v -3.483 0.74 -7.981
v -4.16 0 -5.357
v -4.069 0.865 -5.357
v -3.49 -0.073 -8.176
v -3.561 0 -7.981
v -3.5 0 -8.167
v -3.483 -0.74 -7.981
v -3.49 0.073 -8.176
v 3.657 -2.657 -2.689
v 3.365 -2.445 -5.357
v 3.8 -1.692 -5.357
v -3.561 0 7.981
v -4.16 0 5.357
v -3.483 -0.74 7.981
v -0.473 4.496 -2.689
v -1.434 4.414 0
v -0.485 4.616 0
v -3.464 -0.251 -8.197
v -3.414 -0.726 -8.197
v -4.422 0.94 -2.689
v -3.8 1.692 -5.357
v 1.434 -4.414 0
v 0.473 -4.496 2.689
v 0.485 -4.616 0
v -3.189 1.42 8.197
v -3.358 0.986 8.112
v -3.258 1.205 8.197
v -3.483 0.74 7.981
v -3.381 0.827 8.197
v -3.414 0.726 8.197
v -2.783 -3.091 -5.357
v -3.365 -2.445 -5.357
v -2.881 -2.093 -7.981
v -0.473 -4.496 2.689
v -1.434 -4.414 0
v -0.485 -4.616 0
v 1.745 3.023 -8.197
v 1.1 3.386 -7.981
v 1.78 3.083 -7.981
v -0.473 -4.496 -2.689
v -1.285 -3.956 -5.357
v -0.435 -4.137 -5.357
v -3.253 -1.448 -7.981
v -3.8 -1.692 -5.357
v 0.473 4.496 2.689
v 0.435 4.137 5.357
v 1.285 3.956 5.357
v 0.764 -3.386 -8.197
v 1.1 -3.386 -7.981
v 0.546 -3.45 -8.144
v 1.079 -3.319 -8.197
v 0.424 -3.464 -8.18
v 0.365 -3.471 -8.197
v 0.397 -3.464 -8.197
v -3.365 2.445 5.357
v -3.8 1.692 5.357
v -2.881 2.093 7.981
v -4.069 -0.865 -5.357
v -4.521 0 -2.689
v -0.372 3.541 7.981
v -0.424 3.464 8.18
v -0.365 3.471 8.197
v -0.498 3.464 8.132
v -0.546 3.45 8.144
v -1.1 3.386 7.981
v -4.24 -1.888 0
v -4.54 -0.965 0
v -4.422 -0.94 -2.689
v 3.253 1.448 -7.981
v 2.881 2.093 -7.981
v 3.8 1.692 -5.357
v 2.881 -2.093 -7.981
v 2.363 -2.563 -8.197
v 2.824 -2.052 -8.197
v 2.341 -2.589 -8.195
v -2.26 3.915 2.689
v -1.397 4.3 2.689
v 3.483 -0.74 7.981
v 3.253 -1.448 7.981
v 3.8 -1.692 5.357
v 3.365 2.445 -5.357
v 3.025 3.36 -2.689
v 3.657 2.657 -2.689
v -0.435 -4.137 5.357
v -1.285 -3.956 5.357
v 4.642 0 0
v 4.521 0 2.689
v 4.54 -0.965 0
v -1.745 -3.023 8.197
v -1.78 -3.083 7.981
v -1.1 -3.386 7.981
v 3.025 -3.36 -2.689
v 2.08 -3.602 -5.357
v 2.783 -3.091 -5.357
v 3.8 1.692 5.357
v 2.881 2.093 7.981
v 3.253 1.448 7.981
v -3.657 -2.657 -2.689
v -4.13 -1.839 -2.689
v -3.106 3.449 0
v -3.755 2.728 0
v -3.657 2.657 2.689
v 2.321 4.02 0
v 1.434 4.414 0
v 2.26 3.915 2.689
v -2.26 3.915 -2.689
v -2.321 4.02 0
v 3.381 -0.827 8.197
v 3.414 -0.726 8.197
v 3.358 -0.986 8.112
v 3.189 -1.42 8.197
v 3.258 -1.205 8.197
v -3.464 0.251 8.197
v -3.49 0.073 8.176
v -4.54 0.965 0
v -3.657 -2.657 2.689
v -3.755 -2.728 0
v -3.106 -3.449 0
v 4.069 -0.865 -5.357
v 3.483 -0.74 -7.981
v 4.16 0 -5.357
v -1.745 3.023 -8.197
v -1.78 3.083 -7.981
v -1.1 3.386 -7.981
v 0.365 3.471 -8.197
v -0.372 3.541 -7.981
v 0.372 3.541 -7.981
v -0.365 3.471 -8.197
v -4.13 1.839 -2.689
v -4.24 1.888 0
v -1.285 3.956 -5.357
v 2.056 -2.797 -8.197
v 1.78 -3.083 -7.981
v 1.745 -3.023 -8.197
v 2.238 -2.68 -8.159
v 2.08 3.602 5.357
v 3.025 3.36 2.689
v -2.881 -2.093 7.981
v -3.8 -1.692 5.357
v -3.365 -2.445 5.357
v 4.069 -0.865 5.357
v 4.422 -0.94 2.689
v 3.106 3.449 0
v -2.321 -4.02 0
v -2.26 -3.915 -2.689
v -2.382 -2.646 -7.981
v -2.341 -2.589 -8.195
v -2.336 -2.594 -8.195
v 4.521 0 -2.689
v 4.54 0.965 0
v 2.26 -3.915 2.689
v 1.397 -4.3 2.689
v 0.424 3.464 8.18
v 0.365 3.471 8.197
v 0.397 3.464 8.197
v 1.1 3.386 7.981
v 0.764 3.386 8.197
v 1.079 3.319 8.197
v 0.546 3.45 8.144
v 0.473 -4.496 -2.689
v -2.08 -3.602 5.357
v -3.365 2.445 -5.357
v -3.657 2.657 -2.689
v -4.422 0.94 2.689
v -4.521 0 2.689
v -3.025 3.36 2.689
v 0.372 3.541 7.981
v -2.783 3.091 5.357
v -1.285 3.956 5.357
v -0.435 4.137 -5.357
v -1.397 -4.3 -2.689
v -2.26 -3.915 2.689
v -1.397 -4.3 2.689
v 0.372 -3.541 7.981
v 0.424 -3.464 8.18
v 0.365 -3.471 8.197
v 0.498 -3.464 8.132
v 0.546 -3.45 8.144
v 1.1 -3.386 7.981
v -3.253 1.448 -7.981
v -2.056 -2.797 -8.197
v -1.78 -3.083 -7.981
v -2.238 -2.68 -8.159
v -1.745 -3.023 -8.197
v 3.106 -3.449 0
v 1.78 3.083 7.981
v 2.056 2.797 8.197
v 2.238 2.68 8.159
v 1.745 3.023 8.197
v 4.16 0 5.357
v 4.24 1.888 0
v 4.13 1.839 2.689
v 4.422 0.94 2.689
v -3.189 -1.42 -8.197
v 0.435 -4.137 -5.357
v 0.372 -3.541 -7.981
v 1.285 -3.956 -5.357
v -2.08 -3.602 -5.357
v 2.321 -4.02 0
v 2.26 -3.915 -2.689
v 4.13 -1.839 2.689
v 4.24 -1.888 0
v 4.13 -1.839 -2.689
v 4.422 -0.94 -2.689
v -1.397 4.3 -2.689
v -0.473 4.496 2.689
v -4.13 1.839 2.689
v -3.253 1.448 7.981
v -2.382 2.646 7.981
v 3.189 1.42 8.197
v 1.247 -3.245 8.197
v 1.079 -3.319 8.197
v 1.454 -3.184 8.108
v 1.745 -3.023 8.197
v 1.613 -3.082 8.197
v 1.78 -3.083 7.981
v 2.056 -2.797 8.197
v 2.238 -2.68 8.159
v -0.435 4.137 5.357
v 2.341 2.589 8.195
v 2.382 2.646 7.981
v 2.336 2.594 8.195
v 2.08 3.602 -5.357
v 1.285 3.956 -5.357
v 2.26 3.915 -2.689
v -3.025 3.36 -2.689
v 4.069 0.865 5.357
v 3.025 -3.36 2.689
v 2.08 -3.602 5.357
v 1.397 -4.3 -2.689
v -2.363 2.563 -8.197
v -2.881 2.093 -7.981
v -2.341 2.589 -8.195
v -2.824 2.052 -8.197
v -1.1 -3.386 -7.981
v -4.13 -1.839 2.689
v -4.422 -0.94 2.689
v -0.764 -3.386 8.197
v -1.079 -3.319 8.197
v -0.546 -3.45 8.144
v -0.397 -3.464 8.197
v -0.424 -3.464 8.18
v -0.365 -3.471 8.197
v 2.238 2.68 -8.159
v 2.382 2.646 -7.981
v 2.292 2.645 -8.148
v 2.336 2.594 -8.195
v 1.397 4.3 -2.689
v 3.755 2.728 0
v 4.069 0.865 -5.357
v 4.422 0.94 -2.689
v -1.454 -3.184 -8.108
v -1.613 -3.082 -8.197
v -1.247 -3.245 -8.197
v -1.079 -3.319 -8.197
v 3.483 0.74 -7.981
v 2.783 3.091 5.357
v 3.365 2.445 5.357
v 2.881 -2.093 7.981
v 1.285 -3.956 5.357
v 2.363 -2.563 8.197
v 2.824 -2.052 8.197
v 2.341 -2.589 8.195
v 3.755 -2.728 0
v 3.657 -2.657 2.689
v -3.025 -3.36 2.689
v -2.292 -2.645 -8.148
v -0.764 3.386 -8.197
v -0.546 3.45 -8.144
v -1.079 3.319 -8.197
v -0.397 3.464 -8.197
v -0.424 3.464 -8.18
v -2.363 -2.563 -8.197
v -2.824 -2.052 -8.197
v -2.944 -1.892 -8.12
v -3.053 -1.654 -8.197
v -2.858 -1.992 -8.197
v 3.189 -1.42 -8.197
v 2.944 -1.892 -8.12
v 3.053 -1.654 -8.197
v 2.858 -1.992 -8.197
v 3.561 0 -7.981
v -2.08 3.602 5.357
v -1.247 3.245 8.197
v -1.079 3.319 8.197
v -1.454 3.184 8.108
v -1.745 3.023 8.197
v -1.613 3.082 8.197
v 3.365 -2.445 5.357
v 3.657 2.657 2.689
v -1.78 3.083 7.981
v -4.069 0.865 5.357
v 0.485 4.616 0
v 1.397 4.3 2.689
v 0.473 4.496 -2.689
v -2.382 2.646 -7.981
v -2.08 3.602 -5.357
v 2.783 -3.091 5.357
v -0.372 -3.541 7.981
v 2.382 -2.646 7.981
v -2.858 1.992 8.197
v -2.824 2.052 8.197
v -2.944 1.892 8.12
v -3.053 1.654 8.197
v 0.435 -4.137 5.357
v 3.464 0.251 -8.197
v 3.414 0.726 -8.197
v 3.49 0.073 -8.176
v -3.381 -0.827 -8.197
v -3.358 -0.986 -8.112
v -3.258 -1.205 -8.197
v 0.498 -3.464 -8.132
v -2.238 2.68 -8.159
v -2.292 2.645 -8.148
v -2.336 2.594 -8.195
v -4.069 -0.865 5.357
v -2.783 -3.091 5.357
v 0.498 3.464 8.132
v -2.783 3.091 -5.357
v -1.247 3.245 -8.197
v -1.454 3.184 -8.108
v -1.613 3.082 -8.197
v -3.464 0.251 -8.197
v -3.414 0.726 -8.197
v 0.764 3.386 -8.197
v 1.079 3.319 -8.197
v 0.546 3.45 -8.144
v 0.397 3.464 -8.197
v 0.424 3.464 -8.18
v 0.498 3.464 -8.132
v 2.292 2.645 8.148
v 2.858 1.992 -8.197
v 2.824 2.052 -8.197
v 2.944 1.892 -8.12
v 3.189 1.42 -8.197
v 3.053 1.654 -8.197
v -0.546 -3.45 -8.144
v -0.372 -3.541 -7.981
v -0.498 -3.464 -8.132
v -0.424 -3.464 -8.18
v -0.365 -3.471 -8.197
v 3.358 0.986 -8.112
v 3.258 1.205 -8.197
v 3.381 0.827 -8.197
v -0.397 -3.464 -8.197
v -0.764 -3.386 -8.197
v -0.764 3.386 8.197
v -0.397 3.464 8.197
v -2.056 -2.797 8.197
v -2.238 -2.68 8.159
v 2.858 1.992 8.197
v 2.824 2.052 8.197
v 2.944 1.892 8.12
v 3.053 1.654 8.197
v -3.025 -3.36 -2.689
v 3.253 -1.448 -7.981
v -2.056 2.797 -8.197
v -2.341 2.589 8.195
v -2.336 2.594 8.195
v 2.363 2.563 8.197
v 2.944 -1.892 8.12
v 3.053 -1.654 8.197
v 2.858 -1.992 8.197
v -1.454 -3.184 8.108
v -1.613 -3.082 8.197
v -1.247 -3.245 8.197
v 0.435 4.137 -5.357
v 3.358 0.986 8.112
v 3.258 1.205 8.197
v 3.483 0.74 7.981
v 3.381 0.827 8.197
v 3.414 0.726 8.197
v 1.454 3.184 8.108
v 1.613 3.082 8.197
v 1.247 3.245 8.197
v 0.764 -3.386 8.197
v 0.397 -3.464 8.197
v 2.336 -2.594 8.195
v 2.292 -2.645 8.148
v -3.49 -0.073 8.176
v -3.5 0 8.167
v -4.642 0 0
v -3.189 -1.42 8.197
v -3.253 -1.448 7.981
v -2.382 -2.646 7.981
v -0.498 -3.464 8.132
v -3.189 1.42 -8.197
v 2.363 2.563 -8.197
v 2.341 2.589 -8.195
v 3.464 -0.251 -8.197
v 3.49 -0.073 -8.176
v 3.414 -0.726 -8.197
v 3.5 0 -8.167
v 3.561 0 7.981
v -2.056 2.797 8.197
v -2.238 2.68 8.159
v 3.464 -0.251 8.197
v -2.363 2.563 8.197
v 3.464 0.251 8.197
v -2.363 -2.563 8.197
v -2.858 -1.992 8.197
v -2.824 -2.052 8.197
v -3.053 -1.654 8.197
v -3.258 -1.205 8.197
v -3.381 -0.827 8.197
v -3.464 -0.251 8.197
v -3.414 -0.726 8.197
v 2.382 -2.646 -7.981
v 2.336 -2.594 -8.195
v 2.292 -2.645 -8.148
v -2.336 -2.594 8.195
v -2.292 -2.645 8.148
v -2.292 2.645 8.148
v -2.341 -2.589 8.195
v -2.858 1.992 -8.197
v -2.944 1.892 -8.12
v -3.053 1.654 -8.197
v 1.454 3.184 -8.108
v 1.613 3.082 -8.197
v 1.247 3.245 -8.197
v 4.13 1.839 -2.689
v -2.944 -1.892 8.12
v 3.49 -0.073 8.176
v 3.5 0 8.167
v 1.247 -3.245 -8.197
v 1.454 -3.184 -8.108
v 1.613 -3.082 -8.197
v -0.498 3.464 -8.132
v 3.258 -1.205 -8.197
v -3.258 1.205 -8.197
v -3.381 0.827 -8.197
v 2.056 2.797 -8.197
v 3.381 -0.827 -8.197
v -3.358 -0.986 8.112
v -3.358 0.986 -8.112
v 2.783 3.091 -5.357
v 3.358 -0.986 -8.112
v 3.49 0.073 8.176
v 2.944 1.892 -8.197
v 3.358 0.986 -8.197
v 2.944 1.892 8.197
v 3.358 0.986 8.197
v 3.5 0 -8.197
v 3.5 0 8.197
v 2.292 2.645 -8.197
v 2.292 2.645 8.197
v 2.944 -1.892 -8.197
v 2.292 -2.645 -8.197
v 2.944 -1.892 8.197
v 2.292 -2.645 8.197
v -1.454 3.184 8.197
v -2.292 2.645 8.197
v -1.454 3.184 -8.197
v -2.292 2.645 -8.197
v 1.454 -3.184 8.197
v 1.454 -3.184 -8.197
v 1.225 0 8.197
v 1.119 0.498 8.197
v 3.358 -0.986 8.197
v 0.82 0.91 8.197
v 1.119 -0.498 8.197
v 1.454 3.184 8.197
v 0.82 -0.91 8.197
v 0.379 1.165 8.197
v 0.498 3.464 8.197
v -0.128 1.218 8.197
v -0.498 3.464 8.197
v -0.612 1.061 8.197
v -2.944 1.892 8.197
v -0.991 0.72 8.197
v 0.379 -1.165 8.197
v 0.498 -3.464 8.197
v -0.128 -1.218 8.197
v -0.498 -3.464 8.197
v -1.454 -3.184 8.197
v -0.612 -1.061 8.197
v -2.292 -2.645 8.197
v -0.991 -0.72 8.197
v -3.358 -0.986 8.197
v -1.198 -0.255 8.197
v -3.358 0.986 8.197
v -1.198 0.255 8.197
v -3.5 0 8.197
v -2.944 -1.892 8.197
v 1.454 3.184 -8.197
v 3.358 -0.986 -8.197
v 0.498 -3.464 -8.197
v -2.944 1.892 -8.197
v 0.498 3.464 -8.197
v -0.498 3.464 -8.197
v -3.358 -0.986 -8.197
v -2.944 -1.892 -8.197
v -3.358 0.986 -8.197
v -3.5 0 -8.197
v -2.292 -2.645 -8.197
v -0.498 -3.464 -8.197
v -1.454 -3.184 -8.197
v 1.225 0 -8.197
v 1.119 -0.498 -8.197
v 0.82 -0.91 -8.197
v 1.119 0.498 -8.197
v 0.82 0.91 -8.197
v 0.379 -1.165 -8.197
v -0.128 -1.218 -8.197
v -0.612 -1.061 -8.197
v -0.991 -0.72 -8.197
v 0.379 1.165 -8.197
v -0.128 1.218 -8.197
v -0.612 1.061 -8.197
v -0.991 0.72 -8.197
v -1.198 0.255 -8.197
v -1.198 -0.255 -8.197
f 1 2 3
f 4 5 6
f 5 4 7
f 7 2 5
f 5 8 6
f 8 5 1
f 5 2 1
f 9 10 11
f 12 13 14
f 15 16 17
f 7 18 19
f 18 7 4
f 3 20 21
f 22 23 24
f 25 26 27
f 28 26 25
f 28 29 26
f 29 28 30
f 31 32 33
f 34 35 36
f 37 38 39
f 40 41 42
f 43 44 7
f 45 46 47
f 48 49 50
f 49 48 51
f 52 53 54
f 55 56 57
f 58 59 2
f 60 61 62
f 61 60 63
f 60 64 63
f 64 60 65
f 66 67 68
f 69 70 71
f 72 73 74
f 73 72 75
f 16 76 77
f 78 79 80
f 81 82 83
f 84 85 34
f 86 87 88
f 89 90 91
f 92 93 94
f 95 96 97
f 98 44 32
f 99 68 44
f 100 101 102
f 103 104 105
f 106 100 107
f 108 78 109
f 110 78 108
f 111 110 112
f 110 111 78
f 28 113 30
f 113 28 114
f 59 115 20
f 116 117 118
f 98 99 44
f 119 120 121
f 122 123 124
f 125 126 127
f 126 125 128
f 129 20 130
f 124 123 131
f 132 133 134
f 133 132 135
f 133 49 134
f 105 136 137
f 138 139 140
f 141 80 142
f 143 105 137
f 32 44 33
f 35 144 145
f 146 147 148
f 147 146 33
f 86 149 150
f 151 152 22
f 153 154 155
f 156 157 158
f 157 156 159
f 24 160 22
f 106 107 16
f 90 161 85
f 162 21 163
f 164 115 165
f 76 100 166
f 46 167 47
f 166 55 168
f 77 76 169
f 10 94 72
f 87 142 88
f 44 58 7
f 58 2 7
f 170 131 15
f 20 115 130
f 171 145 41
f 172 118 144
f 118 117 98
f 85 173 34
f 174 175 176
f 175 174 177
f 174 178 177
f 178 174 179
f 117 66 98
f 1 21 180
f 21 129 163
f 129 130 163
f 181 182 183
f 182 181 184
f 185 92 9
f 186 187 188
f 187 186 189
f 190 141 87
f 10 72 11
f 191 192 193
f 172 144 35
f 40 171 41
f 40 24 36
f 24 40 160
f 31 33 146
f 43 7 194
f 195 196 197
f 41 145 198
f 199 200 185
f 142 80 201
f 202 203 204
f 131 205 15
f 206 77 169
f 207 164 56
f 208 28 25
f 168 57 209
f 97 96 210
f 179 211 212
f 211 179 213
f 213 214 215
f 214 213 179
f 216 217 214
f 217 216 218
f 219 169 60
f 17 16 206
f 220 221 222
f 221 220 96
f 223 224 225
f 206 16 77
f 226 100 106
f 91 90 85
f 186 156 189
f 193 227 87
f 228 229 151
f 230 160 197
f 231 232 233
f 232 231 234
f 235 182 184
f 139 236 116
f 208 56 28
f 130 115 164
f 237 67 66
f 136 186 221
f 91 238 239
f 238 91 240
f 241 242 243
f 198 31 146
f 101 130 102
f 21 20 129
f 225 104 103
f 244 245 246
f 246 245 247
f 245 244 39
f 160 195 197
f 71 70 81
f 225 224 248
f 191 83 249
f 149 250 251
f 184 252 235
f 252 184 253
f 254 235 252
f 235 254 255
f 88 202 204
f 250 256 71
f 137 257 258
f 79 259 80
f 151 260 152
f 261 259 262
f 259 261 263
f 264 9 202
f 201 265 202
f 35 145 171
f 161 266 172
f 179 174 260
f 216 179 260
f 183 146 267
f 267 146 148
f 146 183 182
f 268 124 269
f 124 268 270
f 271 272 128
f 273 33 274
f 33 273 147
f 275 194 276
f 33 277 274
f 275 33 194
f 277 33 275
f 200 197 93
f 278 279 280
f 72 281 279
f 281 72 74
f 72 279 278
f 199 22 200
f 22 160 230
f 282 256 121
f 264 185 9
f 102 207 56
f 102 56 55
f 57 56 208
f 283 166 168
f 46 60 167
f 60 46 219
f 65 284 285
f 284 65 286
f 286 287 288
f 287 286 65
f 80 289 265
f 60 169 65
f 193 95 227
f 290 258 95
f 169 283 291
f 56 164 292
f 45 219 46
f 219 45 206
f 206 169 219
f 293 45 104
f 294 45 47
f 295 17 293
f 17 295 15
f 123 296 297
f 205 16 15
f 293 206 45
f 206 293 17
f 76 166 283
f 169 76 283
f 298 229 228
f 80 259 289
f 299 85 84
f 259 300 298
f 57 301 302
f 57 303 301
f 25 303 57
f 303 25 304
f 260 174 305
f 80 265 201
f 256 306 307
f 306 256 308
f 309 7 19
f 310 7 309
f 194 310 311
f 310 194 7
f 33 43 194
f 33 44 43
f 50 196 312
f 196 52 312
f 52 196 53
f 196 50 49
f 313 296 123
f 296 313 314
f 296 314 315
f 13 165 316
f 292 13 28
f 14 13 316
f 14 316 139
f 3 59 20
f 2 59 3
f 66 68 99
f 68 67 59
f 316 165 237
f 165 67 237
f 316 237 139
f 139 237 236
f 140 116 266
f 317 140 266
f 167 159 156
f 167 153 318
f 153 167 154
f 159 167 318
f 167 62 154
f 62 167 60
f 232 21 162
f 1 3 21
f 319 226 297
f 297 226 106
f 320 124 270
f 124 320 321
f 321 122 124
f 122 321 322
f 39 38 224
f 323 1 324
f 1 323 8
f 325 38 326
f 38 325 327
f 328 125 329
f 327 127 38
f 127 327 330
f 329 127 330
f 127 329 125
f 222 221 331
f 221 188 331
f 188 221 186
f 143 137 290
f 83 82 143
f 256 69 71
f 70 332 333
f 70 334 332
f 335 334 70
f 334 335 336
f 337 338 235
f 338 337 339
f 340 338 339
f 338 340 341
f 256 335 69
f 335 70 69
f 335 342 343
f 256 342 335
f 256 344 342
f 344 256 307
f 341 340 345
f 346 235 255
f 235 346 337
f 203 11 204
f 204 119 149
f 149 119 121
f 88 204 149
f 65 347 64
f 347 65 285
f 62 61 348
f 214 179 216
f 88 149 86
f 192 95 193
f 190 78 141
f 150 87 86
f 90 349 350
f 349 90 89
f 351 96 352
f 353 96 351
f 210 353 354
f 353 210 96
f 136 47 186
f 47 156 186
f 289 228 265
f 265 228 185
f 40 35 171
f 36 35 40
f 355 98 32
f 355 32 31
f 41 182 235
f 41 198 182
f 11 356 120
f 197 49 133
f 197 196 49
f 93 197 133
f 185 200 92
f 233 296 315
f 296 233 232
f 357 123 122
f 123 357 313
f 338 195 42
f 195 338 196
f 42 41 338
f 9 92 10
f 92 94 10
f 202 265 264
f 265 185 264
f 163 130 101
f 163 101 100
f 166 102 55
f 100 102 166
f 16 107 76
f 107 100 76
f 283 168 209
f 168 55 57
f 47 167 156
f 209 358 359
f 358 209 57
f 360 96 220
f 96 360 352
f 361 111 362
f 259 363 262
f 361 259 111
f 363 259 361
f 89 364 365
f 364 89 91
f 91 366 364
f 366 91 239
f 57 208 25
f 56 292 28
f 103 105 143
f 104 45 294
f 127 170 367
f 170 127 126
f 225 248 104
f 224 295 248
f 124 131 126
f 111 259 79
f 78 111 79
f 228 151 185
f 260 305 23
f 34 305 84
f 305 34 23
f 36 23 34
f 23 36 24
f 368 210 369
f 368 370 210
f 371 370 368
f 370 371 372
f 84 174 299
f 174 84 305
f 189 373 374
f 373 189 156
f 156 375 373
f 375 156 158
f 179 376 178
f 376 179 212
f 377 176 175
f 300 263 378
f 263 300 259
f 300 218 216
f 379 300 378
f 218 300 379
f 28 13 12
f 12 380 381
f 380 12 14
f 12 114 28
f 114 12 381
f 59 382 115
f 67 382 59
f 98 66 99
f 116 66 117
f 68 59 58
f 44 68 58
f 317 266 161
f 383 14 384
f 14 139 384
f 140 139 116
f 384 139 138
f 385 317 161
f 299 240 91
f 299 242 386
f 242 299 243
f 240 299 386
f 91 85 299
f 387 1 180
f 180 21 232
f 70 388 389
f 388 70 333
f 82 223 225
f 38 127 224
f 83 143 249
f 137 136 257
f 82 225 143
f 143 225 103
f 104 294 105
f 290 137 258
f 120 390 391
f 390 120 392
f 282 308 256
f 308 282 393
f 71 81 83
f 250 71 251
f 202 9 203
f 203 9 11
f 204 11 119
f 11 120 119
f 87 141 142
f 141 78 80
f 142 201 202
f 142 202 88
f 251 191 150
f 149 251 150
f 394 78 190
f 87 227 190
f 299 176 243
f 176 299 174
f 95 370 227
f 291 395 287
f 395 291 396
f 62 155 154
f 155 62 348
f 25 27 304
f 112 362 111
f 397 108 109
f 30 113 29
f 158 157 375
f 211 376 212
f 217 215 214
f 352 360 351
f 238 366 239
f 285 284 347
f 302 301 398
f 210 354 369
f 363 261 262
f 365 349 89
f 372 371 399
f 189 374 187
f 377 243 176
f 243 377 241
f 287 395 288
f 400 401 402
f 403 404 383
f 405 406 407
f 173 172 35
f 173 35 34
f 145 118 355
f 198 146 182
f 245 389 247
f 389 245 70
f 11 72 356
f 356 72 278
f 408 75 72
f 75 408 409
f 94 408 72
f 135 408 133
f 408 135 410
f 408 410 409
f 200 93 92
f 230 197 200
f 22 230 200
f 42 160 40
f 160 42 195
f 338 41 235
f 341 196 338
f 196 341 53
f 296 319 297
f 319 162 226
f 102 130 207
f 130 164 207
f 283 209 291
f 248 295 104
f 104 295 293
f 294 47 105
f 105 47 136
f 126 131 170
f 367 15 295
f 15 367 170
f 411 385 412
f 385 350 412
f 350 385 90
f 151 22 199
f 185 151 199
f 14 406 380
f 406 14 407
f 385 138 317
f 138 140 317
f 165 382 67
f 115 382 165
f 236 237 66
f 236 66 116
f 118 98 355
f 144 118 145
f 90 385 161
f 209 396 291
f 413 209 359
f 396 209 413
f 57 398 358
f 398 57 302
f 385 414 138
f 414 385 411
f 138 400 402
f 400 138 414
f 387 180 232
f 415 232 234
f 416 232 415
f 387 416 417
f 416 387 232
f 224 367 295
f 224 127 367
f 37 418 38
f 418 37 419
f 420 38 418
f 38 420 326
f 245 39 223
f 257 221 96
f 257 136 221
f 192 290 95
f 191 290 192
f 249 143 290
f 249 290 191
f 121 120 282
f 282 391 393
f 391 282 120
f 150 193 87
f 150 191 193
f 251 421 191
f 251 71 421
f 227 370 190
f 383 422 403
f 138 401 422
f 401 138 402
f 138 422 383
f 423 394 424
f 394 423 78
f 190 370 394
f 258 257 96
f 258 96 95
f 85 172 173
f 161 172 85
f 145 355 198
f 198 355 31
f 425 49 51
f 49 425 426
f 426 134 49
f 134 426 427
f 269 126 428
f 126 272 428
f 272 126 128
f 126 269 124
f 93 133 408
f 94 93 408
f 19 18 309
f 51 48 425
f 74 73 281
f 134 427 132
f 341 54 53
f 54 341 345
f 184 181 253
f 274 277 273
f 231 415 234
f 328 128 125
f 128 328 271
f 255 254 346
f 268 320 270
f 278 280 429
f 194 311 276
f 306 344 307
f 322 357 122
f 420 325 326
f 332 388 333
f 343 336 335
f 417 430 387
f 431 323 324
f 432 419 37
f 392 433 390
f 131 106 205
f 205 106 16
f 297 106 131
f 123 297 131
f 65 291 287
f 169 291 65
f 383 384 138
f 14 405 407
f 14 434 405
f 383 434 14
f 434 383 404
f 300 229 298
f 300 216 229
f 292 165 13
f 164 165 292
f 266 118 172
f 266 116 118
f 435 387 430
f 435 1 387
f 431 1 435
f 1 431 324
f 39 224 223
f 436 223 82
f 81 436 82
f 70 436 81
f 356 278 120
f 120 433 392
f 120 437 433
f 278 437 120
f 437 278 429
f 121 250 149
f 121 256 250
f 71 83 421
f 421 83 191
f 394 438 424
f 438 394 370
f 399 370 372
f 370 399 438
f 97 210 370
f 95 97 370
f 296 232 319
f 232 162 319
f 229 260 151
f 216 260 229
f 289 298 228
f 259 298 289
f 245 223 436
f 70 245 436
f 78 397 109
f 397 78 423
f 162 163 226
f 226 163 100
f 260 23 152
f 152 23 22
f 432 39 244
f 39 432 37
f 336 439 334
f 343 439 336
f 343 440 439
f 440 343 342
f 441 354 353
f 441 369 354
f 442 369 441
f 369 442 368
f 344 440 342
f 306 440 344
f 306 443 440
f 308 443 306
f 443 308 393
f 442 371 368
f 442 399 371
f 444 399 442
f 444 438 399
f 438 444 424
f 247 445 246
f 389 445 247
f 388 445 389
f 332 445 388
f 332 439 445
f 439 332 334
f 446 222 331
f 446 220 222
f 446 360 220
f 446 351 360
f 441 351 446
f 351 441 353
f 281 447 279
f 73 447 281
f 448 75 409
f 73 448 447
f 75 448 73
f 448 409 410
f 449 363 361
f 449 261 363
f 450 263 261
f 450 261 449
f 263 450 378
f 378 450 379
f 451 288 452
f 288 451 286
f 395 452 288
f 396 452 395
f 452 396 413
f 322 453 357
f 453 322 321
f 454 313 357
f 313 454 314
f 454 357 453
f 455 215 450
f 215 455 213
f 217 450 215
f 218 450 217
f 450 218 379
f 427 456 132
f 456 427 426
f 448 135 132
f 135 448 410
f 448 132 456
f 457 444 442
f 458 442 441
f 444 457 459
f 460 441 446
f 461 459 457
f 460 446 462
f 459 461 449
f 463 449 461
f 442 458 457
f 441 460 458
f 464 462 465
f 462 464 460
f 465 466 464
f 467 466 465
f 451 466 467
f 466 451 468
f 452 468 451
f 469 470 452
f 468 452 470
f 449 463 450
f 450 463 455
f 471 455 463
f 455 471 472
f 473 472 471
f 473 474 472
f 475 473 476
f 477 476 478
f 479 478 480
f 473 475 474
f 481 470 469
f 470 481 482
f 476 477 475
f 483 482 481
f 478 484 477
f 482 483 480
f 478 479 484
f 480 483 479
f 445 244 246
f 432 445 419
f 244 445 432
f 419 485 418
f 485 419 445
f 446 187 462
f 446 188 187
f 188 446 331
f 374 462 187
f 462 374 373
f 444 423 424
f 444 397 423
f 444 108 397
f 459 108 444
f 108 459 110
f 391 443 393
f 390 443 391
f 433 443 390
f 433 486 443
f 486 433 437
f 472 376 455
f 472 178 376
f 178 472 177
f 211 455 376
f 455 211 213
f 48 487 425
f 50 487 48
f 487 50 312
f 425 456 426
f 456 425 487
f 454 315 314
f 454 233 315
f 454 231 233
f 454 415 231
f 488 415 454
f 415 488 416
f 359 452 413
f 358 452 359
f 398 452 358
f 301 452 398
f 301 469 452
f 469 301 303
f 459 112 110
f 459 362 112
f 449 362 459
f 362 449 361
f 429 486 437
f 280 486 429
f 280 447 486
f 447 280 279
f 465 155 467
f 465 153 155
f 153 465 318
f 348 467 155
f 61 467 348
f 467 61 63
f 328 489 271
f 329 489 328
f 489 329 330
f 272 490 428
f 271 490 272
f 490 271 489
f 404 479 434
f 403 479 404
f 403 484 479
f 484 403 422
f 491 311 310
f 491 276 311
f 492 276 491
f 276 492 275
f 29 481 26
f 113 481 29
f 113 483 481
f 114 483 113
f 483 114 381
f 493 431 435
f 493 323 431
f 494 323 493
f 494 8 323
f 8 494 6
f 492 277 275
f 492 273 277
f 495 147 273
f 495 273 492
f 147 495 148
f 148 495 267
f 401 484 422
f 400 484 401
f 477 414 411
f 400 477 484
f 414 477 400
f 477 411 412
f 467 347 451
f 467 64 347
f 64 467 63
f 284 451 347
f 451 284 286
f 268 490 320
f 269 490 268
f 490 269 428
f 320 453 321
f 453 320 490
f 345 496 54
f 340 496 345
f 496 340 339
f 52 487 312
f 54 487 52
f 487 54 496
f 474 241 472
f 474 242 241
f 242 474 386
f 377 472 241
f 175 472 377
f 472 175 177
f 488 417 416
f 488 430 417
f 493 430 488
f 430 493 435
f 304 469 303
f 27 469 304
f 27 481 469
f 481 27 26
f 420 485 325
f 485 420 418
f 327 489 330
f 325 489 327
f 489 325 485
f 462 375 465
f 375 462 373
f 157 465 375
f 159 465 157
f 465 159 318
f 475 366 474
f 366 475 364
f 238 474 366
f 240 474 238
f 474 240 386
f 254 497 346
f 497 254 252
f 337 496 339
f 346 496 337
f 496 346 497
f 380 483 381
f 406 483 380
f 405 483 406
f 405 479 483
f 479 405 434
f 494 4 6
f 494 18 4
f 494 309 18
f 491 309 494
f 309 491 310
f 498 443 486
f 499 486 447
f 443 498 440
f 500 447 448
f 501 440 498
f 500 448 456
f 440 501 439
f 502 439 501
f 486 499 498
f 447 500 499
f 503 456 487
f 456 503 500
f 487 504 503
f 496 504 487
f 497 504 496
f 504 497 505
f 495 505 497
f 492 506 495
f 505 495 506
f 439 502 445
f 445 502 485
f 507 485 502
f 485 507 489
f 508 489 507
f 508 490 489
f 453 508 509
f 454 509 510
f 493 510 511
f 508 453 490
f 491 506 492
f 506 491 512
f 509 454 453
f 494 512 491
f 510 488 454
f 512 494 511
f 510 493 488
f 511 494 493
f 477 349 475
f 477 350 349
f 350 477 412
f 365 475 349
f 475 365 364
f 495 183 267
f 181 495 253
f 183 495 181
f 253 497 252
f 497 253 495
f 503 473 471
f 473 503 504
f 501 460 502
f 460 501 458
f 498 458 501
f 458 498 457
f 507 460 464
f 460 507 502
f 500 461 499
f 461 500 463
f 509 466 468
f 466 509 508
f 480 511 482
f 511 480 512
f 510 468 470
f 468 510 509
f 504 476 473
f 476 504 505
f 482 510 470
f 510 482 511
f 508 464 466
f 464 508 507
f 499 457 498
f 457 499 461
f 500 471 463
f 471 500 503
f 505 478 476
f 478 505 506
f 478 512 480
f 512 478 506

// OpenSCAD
/*
	.scad file created for the subwheel system of the 3D Printable Omni-Wheels used for a robot.
	
	
	Author 	= Xasin
	Website = https://www.github.com/xasin/hexa-bot.git
	Created	= 17.09.15
*/


function subwheelRadius(n, r) = r - cos(360/(2*n) + subwheelOverlap)*r + subwheelBaseSize;		//Calculate the radius of a standard subwheel at largest point (Center)
function wheelOffset(n, r) = cos(360/(2*n) + subwheelOverlap)*r;						//Calculate the offset of a subwheel that is required to shift it so that it aligns with the main circle (CAUTION Does not implement subwheel size shift!!)
function connectorOffset(n, r) = (sin(360/(2*n) + subwheelOverlap)*r);					//Calculate the offset for the cuts on the wheels. (Y axis on the 2D model of a subwheel before being rotated.
	
$fs = 1;

//What to generate - 1 means base frame, 2 means subwheel piece
generate = 2;

//GENERATION VARIABLES 
//Number of all subwheels to create. (Has to be a round number)
num = 7*2;
//Radius of the omni-wheel.
radius = 30;	

//CONNECTION AXIS VARIABLES 
//Diameter of the axis the Omni-Wheel will be connected to.
axisDiameter = 22.3;	
//Height of the cylinder that will connect axis and omniwheel together.
axisConnectorHeight = 7; 	
//Thickness of the axis connector.
axisConnectorThickness = 1.0; 	

//SUBWHEEL VARIABLES
//Size of the subwheels at their smallest point (The edge)
subwheelBaseSize = 3.5;
//The additional size that will be cut out around the subwheels to ensure smooth movement
subwheelPlay = 1; 		
//By what angle should the wheels overlap? This should result in smoother running, but at the same time might cause problems if this value is too big.
subwheelOverlap = 3; 	

//SUBWHEEL AXIS HOLE VARIABLE
subwheelAxisDiameter = 1.75;
subwheelAxisPlay = 0.7;

//SUBWHEEL CONNECTOR VARIABLES
//Radius of the connectors to the subwheels (Best is slightly smaller than the subwheel.
cRad = subwheelAxisDiameter/2 + 1.5; 	
//Thickness of the connectors.
cThick = 0.8; 					
//Play room for the connector ports (distance to the subwheel)
cPlay = 0.3; 					

//FRAME VARIABLES
//frameRadius = connectorOffset(num, radius) + cPlay + cThick;	
//Radius of the frame Cylinder
frameRadius = 15;
//Height of the frame (not including the connectors
frameHeight = cRad + subwheelRadius(num, radius);
//Thickness of the main frame
frameThickness = 0.8;		

//STABILITY BEAM VARIABLES
//Thickness of the stability beams
beamThickness = 5; 	
// Height of the stability beams
beamHeight = 3;
//How many beams should be created?
beamNum = 7;

//CONNECTOR VARIABLES
//Thickness of the vertical connectors
connectorThickness = 0.8;
//Inwards shift of the vertical connector beams (for smoother connection)
connectorInShift = 0.2;
//Height of the connector pieces above the main frame.
connectorHeight = 2.5;
//How many connectors should be created
connectorNum = 7;			


module shine(angle=10, length=10, height=10, center=true) {
    if($children != 0) {
        intersection() {
            linear_extrude(height) {
                if(center) {
                    polygon([[0,0] , [length*cos(angle/2),length*sin(angle/2)] , [length,0] , [length*cos(-angle/2),length*sin(-angle/2)]]);
                }
                else {
                    polygon([[0,0] , [length*cos(angle),length*sin(angle)] ,  [length*cos(angle/2),length*sin(angle/2)] , [length,0]]);
                }
            } 
            children(); 
        }
    }   
    else {
        linear_extrude(height) {
            if(center) {
                polygon([[0,0] , [length*cos(angle/2),length*sin(angle/2)] , [length,0] , [length*cos(-angle/2),length*sin(-angle/2)]]);
            }
            else {
                polygon([[0,0] , [length*cos(angle),length*sin(angle)] ,  [length*cos(angle/2),length*sin(angle/2)] , [length,0]]);
            }
        }
    }  
}  

module subwheelBase(n, r=20, p=0, shift = subwheelBaseSize, split=true, positioned=true) {  //The base structure of a Subwheel, basically a slice of a circle of the radius of the wheel, cut down to be rotated into a proper subwheel for a wheel of Radius R with N Subwheels.
	
	//Position the wheel according to the given parameters (Aling it to the outside of the main wheel and rotate it around into position p.)
	render(4) if(positioned) {
		//Rotate to the according outside position.
		rotate([0, 0, (360/n) * p])
		//Translate to the edge of the circle
		translate([ wheelOffset(n, r) - shift, 0, 0])
		//Rotate into horizontal position
		rotate([-90, 0, 0]) 
		//The main core of the subwheel
		subwheelBase(n, r, p, shift, split, false);
	}
	//Generate a standard subwheel without moving it around.
	else {
		render(convexity=4) difference() {				//Render the subwheel and make it hollow.
			union() {
				rotate_extrude() difference() {		//Generate the main subwheel
					intersection() {					//2D Model for the basic subwheel
						translate([ - wheelOffset(n, r) + shift, 0]) circle(r=r, $fn = 70);		//Main circle	
						translate([0, - sin(360/(2*n) + subwheelOverlap)*r]) square(sin(360/(2*n) + subwheelOverlap)*r *2);			//Intersecting square to only have the desired part of the circle
					}	
						
				}
				translate([0, 0, - sin(360/(2*n) + subwheelOverlap)*r]) cylinder(r=shift, h= sin(360/(2*n) + subwheelOverlap)*r *2);	//Central cylinder inside for the axis.
			}
			
			if(split) {
				translate([0,0,-(sin(360/(2*n) + subwheelOverlap)*r)]) {
                    //Slot for the Filament-Axis, rolling
                    cylinder(d=subwheelAxisDiameter + subwheelAxisPlay, h=2* sin(360/(2*n) + subwheelOverlap)*r, $fn=15);	
                }
			}
		}
	}
}

//Create the connecting beams for the subwheels
module subwheelConnector(n, r, i) {
	render(convexity = 3)
	rotate([0,0, (360/n)*i]) 
	difference() {				//The difference cuts the hole for the axis into the connectors
		intersection() {		//The intersection makes sure that the subwheel connectors don't poke outside of the wheel radius. This should not be nececary, but for smaller subwheel base sizes might be desirable.
			union() {		//The cylinders here are the end cylinders on either side of the connector, the cubes are the beams that connect those cylinders to the main frame.
				translate([wheelOffset(n, r) - subwheelBaseSize, connectorOffset(n, r) + cPlay + cThick]) rotate([90, 0, 0]) cylinder(r= cRad, h= cThick, $fn = 13);		
				
				translate([0, connectorOffset(n, r) + cPlay, -cRad]) 
					cube([wheelOffset(n, r) - subwheelBaseSize, cThick, cRad*2]);
				
				translate([wheelOffset(n, r) - subwheelBaseSize, -connectorOffset(n, r) - cPlay]) rotate([90, 0, 0]) cylinder(r= cRad, h= cThick, $fn = 13);
						
				translate([0, -connectorOffset(n, r) - cPlay - cThick, -cRad]) 
					cube([wheelOffset(n, r) - subwheelBaseSize, cThick, cRad*2]);
			}
			
			translate([0,0, -cRad]) cylinder(r=r - 0.3, h= cRad*2);
		}
		
		translate([wheelOffset(n, r) - subwheelBaseSize, connectorOffset(n, r) + 5, 0]) rotate([90,0,0]) cylinder(d= subwheelAxisDiameter + 0.3, h= connectorOffset(n, r)*2 + 10, $fn=14);		//Cylinder for the axis hole.
	}
}

//Create a set of subwheels as they would be normally positioned. Inflated = true makes them bigger; useful for creating space around the wheels.
module subwheelSet(n, r, inflated=false) {
	for(i=[0:2:n]) { 	
		if(inflated) {		
			subwheelBase(n, r, i, shift = subwheelBaseSize + subwheelPlay, split=false);									//Create a /bigger/ subwheel in normal, ground position.
		}
		else {
			subwheelBase(n, r, i);									//Do the same as above, however using default subwheels instead of bigger subwheels here.
		}
	}
}

//Create a subwheel connector set for the according wheel of size r with n subwheels.
module connectorSet(n, r) {
	for(i=[0:2:n]) {
		subwheelConnector(n, r, i);
	}
}

//Create the central cylinder piece.
module centralCylinder(n, r) {
	render(convexity = 4) translate([0,0, - cRad]) difference() {
		cylinder(r= frameRadius, h= frameHeight);		//Create the central cylinder.
		cylinder(r= frameRadius - frameThickness, h= frameHeight);	//Hollow it out
	}
}
		
//Create the pieces that connect the two Omniwheel pieces together
module interconnectorPiece(r) {
	difference() {
		shine(height= frameHeight + connectorHeight, angle=(360/connectorNum/2) - 0.5, length= r)
		//"Shine" is a custom function that cuts down an object to a specific angle
		union() {
			cylinder(r= frameRadius - 0.1, h= frameHeight);		//Cylinder piece to connect the connector to the main frame.
			cylinder(r= frameRadius - frameThickness - connectorInShift, h= frameHeight + connectorHeight);		//Cylinder piece for the actual interconnector. This one is slightly smaller due to printing imperfections, thusly making sure that the pieces fit together nicely.
		}
		cylinder(r= frameRadius - frameThickness - connectorThickness - connectorInShift, h= frameHeight + connectorHeight);		//Hollow the interconnection pieces out so that they have the correct thickness.
		
	}
}
//Create the interconnections between two wheel pieces
module interconnections(n, r) {
	render(convexity= 2) translate([0,0, -cRad])
		for(i=[0:(360/connectorNum):360]) 
			rotate([0,0, i + 360/connectorNum])											
			interconnectorPiece(r);	
}

//Create the structural beams inside the subwheel for better stability.
module structuralBeams() {
	render(convexity = 4) translate([0,0, -cRad]) intersection() {
		cylinder(r= frameRadius, h= cRad*2);		//Make sure that the structural beams don't poke out of the main frame.
		
		for(i=[0:360/beamNum:360]) 
			rotate([0,0, i + 360/beamNum/2]) translate([0, -beamThickness/2, 0]) cube([frameRadius, beamThickness, beamHeight]);		//Create the beams.
	}
}

//The Mainframe of the OmniWheel
module omniWheel(n, r, subwheels = false) {
	difference() {  
		union() {
		
			//Central Cylinder 
			centralCylinder(n, r);
			
			//Cylinder Interconnections
			interconnections(n, r);

			//Structural beams
			structuralBeams();
			
			//Connectors
			render(convexity = 5) difference() {
				connectorSet(n, r);			//Create the connectors
				translate([0,0, -cRad]) cylinder(r= frameRadius - 0.001, h= frameHeight); //Make sure they don't enter the central cylinder
			}
			
			translate([0,0, -cRad]) cylinder(d= axisDiameter + 2* axisConnectorThickness, h= axisConnectorHeight);
		}
		subwheelSet(n, r, true); 	//Make sure that there is enough space for the subwheels.
		translate([0,0, -cRad]) cylinder(d= axisDiameter, h= frameHeight);
	}
	
	%subwheelSet(n, r);		//Create subwheels around the model for a better visual inspection.
}

if(generate == 1) {
	omniWheel(num, radius, true);
}
else if(generate == 2) { 
	subwheelBase(num, radius, positioned=false);
}
